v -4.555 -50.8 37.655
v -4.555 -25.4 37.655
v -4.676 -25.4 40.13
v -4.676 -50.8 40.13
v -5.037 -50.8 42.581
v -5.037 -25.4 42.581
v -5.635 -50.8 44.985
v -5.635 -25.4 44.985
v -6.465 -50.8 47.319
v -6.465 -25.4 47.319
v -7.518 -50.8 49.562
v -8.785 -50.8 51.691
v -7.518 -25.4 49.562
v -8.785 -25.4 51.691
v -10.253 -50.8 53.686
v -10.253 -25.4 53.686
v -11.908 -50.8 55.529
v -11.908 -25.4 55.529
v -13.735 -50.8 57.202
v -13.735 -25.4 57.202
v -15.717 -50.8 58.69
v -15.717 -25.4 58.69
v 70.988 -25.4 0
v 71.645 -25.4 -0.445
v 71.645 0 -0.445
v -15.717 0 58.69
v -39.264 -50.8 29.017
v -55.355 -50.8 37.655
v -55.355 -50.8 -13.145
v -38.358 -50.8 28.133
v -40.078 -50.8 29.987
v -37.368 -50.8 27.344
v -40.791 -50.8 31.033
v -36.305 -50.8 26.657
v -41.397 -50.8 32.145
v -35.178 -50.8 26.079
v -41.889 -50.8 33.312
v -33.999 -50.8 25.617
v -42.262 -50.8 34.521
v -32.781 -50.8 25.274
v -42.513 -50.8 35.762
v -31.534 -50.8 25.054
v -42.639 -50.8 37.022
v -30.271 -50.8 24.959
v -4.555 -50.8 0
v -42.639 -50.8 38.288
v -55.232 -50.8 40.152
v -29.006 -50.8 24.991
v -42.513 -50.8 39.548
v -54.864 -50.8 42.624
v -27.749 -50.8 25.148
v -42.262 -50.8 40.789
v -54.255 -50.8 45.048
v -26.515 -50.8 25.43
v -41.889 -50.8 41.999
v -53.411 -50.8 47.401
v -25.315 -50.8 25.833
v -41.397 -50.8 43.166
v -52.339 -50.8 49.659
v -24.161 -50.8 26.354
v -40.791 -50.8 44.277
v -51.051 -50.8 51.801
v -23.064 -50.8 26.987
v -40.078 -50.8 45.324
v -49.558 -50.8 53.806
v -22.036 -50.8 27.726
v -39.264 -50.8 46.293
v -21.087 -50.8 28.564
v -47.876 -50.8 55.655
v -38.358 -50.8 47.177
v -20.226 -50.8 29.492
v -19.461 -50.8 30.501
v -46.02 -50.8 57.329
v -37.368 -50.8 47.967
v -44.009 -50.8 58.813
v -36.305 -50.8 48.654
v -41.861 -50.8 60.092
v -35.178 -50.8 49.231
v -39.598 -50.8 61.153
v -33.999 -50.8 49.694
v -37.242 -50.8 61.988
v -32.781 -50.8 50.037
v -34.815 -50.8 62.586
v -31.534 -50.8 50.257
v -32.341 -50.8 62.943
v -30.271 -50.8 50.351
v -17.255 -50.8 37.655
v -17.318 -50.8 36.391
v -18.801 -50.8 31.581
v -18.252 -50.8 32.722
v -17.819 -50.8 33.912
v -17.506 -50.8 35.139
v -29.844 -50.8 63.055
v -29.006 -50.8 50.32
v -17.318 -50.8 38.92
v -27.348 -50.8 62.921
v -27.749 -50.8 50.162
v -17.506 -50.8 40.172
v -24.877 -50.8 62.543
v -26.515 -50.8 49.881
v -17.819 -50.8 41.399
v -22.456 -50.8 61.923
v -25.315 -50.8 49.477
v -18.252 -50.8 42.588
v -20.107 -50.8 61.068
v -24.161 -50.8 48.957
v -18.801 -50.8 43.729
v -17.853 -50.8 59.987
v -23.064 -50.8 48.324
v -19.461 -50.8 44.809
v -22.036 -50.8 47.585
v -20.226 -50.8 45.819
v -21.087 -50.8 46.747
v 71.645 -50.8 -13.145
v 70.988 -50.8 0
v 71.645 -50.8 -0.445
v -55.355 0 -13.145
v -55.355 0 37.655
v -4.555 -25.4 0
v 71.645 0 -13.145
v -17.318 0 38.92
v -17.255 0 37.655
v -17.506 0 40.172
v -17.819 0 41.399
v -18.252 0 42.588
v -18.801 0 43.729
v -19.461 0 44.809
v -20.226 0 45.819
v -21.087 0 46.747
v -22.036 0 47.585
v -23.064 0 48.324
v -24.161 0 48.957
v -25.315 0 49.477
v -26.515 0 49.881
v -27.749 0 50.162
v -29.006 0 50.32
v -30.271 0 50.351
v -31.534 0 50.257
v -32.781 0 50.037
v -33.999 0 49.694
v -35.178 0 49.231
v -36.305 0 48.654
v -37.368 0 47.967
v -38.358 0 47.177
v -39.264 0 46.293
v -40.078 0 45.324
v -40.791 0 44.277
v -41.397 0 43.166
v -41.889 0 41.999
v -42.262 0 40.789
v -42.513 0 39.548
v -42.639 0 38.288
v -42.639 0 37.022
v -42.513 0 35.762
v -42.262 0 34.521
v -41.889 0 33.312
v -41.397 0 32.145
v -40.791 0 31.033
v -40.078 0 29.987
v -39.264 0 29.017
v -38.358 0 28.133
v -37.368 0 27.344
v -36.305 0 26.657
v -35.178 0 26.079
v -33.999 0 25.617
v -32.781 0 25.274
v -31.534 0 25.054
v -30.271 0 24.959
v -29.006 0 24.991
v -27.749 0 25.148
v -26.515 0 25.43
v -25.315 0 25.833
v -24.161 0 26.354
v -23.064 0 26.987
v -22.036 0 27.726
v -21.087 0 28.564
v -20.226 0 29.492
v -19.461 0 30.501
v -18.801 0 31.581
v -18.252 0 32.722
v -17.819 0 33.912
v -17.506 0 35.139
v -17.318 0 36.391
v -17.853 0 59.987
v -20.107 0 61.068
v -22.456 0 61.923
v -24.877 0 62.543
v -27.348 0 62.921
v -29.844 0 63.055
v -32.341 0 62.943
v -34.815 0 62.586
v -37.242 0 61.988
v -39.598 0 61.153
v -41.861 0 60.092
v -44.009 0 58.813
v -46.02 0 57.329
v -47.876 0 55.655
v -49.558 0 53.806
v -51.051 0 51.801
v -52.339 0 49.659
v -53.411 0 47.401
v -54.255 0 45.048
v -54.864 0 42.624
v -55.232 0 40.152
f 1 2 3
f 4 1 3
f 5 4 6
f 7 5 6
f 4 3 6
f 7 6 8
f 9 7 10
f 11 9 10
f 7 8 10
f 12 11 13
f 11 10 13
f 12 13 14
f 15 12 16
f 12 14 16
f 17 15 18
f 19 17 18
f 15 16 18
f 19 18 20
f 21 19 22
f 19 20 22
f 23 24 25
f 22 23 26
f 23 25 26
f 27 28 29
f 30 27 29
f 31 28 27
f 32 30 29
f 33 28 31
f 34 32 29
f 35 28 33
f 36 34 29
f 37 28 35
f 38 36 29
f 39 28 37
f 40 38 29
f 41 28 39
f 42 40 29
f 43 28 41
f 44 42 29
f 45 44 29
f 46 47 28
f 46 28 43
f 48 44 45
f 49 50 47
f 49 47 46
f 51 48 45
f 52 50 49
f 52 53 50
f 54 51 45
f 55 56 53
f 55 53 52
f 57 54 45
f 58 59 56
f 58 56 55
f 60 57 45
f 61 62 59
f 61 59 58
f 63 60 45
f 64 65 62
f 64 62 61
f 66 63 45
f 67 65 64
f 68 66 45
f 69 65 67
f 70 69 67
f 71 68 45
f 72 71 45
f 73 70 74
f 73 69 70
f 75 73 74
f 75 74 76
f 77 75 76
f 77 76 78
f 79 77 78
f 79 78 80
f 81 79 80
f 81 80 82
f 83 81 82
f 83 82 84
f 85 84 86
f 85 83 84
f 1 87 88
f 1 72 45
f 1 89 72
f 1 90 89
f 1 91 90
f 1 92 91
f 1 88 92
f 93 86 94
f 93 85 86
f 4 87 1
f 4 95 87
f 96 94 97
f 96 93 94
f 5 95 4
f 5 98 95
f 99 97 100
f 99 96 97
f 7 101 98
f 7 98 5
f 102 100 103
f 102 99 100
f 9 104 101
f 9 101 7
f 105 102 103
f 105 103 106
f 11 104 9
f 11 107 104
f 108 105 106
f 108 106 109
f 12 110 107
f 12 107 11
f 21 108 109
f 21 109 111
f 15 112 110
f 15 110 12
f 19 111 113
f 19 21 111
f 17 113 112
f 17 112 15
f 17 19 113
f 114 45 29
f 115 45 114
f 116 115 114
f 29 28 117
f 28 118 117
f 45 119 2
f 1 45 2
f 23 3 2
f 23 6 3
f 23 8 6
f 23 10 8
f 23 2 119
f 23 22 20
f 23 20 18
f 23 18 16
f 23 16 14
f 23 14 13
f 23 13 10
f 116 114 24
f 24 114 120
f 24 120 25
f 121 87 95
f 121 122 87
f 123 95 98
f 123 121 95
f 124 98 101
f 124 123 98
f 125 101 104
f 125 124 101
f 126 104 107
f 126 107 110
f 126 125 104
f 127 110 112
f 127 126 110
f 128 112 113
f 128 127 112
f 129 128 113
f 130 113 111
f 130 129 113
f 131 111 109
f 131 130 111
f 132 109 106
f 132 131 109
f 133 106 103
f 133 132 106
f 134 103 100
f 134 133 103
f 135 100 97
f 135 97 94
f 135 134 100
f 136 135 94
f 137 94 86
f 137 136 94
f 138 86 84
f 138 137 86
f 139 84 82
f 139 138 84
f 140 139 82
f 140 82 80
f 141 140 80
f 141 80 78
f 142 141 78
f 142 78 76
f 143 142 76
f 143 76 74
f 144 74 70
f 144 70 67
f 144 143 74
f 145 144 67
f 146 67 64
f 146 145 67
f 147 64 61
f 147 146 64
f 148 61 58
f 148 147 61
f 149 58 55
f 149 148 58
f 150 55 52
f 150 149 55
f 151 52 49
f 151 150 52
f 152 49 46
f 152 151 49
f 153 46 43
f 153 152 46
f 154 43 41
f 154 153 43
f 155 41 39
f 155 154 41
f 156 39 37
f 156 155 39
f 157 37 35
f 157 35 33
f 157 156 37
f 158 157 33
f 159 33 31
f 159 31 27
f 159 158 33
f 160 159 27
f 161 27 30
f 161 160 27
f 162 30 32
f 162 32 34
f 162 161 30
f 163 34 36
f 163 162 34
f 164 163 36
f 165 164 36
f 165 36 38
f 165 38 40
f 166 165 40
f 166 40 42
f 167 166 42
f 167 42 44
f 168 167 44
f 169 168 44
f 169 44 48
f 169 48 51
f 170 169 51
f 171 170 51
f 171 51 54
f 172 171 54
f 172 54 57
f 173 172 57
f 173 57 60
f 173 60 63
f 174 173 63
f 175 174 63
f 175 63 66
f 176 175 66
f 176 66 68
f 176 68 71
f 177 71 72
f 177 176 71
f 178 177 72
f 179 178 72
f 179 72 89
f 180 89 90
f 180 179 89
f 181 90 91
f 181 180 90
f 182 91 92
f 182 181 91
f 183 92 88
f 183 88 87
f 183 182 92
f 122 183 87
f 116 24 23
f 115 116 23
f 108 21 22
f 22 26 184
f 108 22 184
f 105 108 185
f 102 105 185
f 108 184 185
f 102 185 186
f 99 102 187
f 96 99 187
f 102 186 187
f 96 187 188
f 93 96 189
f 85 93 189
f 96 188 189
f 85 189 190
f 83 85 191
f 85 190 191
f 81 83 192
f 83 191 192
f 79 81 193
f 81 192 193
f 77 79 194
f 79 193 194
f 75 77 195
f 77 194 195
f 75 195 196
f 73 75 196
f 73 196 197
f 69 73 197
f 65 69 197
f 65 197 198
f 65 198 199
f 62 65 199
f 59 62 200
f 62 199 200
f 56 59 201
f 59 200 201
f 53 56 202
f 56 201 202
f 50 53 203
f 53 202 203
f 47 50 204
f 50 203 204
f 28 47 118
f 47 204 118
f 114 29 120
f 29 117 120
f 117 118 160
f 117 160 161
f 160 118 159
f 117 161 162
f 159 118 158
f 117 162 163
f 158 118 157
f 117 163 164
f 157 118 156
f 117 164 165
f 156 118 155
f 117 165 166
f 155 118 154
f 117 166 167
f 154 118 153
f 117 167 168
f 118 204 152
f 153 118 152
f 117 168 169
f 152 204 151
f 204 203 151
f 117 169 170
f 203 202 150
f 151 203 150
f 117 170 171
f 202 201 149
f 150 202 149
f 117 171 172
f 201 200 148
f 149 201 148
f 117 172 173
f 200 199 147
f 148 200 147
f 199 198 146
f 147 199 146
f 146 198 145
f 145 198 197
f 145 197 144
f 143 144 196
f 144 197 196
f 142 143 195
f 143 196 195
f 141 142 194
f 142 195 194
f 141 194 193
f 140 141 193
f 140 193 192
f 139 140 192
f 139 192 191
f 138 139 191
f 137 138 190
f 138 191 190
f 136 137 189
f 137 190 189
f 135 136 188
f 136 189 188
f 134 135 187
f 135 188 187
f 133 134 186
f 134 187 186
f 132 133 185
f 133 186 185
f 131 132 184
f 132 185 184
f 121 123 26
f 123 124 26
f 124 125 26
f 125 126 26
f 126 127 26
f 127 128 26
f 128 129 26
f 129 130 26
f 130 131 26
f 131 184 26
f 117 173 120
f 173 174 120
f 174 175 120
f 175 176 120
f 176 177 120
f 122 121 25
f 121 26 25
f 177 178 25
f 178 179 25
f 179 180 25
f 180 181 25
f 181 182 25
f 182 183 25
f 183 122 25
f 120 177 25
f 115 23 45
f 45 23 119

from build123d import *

# Parameters (mm, degrees)
F0_R     = 12.7
F1_DEPTH = 25.4
F2_R     = 12.7
F3_DEPTH = 25.4


with BuildPart() as f1:
    # F0 (on Front) → F1 (new body)
    with BuildSketch(Plane.XZ):
        with BuildLine():
            Line((71.645316, -0.444731), (-15.716811, 58.689598))
            ThreePointArc((-15.716811, 58.689598), (-41.860943, 60.091868), (-55.354684, 37.655269))
            Line((-55.354684, 37.655269), (-55.354684, -13.144731))
            Line((-55.354684, -13.144731), (71.645316, -13.144731))
            Line((71.645316, -13.144731), (71.645316, -0.444731))
        make_face()
        with Locations((-29.954684, 37.655269)):
            Circle(F0_R, mode=Mode.SUBTRACT)
    extrude(amount=F1_DEPTH)

    # F2 (on face) → F3 (join)
    with BuildSketch(Plane.XZ.offset(25.4)):
        with BuildLine():
            Line((-4.554684, 0), (-4.554684, 37.655269))
            ThreePointArc((-4.554684, 37.655269), (-7.518084, 49.561528), (-15.716811, 58.689598))
            ThreePointArc((-15.716811, 58.689598), (-41.860943, 60.091868), (-55.354684, 37.655269))
            Line((-55.354684, 37.655269), (-55.354684, 0))
            Line((-55.354684, 0), (-55.354684, -13.144731))
            Line((-55.354684, -13.144731), (71.645316, -13.144731))
            Line((71.645316, -13.144731), (71.645316, -0.444731))
            Line((71.645316, -0.444731), (70.988293, 0))
            Line((70.988293, 0), (-4.554684, 0))
        make_face()
        with Locations((-29.954684, 37.655269)):
            Circle(F2_R, mode=Mode.SUBTRACT)
    extrude(amount=F3_DEPTH)


solid = f1.part
